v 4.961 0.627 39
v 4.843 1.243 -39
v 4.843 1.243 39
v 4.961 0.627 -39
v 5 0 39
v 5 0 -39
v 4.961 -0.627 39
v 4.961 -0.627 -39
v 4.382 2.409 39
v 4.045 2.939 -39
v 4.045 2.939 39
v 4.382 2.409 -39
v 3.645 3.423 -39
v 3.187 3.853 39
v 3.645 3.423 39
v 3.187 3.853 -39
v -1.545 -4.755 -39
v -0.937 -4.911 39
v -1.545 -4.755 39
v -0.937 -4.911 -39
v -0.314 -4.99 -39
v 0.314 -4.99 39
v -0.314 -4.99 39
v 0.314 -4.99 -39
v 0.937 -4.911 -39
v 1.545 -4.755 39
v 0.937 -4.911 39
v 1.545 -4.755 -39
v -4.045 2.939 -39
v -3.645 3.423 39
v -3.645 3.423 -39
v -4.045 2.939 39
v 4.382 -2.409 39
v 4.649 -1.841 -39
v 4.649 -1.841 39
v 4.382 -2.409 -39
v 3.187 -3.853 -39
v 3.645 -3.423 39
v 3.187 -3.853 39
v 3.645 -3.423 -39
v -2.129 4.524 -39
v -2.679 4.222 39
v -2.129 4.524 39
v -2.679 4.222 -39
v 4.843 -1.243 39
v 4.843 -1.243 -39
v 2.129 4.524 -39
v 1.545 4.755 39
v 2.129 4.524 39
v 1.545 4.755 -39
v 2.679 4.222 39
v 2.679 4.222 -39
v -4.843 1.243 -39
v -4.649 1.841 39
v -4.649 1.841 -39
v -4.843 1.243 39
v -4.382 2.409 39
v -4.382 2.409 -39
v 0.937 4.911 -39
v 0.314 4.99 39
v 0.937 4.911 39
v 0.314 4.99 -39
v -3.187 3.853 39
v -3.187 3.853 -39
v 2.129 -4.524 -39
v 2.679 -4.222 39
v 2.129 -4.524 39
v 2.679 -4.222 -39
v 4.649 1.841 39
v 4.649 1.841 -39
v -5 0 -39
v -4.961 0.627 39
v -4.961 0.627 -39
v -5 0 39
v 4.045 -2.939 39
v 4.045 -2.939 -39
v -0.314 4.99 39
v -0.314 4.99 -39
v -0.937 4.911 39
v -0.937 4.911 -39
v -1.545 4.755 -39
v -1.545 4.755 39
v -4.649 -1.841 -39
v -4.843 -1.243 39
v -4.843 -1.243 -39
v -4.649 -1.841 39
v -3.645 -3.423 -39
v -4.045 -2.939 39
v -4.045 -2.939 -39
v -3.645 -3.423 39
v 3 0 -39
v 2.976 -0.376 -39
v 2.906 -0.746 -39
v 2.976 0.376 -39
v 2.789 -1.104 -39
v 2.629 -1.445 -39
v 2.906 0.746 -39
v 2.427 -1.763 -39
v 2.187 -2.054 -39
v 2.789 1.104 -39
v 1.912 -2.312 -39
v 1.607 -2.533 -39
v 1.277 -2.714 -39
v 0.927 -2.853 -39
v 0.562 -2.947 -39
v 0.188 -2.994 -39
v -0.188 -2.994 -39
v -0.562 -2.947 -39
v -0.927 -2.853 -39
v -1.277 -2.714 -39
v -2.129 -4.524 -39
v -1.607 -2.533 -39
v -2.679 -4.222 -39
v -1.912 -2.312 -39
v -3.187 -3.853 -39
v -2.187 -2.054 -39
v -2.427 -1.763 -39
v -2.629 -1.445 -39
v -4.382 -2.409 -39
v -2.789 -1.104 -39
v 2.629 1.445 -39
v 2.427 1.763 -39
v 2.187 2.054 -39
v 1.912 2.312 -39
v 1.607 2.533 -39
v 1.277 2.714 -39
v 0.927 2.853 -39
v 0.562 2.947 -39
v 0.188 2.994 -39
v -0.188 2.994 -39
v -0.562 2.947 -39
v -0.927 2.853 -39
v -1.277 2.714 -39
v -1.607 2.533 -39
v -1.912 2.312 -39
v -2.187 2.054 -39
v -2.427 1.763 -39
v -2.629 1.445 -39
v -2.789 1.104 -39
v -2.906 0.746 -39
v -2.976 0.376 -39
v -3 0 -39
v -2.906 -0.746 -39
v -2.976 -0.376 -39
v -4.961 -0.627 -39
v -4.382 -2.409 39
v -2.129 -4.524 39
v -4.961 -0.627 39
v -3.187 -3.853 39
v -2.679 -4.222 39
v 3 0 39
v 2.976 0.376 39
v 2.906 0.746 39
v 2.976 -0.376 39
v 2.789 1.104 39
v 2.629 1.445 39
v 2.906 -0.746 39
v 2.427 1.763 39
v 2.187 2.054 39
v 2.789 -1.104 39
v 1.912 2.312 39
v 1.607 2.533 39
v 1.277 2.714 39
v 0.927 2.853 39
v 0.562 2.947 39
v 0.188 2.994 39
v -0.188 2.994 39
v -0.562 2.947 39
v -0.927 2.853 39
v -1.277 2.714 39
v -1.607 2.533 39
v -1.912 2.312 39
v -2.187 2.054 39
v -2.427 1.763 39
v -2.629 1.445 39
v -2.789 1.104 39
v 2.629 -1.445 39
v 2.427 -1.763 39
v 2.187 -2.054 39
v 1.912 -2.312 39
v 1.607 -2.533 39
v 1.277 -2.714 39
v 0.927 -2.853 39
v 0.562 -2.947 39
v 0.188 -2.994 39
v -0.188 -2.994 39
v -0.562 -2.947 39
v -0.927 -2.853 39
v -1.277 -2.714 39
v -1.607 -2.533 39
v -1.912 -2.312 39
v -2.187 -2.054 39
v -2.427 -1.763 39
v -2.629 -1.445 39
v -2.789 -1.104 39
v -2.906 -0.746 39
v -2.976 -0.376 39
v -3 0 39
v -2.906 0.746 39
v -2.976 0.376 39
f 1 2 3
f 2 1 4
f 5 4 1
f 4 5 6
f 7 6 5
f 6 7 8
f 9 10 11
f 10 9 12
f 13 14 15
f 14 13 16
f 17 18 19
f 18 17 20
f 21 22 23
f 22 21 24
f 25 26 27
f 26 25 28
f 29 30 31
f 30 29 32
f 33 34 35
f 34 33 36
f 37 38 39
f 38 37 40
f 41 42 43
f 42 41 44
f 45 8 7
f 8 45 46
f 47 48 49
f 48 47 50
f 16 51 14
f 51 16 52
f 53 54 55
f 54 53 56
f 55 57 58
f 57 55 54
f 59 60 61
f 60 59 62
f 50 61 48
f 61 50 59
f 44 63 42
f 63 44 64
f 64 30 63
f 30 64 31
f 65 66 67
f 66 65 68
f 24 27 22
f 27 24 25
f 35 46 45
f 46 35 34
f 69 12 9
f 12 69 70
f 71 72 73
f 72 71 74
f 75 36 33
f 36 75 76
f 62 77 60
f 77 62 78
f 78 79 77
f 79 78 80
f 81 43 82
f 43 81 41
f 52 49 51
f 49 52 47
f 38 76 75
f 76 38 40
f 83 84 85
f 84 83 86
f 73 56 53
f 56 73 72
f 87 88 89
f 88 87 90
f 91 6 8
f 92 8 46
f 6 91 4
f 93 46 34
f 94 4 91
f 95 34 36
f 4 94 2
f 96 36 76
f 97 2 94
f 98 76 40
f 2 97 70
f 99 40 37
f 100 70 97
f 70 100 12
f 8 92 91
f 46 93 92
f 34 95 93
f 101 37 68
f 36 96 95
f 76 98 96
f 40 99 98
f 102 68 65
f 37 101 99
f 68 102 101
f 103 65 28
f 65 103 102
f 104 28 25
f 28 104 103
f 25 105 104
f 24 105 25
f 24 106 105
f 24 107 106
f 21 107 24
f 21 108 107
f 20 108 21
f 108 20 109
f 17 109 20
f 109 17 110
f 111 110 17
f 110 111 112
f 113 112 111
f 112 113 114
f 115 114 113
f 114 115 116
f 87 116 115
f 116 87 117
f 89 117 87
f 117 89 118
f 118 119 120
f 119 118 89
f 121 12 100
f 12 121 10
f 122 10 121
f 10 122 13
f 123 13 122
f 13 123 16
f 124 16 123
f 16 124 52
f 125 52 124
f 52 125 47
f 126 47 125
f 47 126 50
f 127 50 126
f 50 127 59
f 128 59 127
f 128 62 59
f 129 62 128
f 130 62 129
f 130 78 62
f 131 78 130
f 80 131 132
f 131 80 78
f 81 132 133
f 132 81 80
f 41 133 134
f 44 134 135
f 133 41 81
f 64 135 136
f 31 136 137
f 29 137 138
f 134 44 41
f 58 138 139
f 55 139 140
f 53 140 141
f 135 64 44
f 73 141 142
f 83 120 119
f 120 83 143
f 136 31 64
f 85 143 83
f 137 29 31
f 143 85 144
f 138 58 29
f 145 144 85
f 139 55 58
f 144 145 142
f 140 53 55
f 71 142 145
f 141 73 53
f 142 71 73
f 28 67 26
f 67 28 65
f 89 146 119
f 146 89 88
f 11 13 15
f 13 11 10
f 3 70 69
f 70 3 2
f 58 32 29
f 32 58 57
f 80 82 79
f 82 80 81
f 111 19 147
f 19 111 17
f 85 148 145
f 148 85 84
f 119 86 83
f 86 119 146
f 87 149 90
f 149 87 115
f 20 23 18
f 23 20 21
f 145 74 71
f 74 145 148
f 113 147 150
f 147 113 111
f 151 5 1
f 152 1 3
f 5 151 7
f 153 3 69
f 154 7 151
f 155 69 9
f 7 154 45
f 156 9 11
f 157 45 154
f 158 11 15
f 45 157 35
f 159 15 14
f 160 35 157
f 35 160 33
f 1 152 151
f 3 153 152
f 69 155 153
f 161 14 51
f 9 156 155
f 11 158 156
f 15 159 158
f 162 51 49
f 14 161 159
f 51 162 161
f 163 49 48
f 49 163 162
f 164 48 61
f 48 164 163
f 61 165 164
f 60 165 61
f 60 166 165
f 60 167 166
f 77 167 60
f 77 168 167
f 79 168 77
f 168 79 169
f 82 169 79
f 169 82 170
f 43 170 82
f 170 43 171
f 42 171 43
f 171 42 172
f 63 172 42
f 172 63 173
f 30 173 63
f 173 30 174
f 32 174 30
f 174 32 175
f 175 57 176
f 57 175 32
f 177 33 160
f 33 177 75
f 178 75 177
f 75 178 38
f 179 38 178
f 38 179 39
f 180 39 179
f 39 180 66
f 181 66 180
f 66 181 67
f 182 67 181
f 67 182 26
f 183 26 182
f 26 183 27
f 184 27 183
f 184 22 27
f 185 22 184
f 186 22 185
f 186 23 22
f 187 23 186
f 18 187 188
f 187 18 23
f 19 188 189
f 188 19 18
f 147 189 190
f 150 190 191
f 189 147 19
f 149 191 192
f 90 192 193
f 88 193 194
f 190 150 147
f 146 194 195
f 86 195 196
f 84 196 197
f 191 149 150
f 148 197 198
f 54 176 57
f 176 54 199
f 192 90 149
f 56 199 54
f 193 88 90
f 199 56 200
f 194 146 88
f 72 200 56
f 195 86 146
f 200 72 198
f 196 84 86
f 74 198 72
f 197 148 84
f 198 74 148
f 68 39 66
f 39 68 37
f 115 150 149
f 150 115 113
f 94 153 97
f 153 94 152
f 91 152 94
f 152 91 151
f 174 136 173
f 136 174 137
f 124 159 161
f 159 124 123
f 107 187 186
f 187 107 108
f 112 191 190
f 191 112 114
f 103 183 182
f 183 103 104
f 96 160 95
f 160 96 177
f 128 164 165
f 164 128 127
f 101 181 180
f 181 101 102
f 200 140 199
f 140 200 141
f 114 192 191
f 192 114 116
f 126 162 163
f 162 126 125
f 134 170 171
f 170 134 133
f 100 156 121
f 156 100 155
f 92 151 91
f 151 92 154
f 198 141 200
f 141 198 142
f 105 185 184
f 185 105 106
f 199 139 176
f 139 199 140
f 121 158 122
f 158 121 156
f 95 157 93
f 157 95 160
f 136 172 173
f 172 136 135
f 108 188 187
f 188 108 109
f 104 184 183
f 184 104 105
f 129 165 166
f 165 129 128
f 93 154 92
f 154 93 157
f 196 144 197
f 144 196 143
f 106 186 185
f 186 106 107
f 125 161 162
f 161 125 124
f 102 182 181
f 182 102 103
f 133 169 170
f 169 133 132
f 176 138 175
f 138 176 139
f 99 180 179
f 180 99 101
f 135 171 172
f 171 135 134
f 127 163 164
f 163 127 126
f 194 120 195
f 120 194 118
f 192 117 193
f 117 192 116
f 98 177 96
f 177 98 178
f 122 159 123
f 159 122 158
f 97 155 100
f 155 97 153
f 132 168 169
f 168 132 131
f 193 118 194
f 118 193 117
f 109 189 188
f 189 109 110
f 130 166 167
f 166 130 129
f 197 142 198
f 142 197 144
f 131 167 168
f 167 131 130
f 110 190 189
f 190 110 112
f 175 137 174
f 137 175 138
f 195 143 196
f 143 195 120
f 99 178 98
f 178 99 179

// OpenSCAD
$fn = 50;


difference() {
	union() {
		translate(v = [0, 0, -39.0000000000]) {
			cylinder(h = 78, r = 5.0000000000);
		}
	}
	union() {
		translate(v = [0, 0, -100.0000000000]) {
			cylinder(h = 200, r = 3.0000000000);
		}
	}
}
